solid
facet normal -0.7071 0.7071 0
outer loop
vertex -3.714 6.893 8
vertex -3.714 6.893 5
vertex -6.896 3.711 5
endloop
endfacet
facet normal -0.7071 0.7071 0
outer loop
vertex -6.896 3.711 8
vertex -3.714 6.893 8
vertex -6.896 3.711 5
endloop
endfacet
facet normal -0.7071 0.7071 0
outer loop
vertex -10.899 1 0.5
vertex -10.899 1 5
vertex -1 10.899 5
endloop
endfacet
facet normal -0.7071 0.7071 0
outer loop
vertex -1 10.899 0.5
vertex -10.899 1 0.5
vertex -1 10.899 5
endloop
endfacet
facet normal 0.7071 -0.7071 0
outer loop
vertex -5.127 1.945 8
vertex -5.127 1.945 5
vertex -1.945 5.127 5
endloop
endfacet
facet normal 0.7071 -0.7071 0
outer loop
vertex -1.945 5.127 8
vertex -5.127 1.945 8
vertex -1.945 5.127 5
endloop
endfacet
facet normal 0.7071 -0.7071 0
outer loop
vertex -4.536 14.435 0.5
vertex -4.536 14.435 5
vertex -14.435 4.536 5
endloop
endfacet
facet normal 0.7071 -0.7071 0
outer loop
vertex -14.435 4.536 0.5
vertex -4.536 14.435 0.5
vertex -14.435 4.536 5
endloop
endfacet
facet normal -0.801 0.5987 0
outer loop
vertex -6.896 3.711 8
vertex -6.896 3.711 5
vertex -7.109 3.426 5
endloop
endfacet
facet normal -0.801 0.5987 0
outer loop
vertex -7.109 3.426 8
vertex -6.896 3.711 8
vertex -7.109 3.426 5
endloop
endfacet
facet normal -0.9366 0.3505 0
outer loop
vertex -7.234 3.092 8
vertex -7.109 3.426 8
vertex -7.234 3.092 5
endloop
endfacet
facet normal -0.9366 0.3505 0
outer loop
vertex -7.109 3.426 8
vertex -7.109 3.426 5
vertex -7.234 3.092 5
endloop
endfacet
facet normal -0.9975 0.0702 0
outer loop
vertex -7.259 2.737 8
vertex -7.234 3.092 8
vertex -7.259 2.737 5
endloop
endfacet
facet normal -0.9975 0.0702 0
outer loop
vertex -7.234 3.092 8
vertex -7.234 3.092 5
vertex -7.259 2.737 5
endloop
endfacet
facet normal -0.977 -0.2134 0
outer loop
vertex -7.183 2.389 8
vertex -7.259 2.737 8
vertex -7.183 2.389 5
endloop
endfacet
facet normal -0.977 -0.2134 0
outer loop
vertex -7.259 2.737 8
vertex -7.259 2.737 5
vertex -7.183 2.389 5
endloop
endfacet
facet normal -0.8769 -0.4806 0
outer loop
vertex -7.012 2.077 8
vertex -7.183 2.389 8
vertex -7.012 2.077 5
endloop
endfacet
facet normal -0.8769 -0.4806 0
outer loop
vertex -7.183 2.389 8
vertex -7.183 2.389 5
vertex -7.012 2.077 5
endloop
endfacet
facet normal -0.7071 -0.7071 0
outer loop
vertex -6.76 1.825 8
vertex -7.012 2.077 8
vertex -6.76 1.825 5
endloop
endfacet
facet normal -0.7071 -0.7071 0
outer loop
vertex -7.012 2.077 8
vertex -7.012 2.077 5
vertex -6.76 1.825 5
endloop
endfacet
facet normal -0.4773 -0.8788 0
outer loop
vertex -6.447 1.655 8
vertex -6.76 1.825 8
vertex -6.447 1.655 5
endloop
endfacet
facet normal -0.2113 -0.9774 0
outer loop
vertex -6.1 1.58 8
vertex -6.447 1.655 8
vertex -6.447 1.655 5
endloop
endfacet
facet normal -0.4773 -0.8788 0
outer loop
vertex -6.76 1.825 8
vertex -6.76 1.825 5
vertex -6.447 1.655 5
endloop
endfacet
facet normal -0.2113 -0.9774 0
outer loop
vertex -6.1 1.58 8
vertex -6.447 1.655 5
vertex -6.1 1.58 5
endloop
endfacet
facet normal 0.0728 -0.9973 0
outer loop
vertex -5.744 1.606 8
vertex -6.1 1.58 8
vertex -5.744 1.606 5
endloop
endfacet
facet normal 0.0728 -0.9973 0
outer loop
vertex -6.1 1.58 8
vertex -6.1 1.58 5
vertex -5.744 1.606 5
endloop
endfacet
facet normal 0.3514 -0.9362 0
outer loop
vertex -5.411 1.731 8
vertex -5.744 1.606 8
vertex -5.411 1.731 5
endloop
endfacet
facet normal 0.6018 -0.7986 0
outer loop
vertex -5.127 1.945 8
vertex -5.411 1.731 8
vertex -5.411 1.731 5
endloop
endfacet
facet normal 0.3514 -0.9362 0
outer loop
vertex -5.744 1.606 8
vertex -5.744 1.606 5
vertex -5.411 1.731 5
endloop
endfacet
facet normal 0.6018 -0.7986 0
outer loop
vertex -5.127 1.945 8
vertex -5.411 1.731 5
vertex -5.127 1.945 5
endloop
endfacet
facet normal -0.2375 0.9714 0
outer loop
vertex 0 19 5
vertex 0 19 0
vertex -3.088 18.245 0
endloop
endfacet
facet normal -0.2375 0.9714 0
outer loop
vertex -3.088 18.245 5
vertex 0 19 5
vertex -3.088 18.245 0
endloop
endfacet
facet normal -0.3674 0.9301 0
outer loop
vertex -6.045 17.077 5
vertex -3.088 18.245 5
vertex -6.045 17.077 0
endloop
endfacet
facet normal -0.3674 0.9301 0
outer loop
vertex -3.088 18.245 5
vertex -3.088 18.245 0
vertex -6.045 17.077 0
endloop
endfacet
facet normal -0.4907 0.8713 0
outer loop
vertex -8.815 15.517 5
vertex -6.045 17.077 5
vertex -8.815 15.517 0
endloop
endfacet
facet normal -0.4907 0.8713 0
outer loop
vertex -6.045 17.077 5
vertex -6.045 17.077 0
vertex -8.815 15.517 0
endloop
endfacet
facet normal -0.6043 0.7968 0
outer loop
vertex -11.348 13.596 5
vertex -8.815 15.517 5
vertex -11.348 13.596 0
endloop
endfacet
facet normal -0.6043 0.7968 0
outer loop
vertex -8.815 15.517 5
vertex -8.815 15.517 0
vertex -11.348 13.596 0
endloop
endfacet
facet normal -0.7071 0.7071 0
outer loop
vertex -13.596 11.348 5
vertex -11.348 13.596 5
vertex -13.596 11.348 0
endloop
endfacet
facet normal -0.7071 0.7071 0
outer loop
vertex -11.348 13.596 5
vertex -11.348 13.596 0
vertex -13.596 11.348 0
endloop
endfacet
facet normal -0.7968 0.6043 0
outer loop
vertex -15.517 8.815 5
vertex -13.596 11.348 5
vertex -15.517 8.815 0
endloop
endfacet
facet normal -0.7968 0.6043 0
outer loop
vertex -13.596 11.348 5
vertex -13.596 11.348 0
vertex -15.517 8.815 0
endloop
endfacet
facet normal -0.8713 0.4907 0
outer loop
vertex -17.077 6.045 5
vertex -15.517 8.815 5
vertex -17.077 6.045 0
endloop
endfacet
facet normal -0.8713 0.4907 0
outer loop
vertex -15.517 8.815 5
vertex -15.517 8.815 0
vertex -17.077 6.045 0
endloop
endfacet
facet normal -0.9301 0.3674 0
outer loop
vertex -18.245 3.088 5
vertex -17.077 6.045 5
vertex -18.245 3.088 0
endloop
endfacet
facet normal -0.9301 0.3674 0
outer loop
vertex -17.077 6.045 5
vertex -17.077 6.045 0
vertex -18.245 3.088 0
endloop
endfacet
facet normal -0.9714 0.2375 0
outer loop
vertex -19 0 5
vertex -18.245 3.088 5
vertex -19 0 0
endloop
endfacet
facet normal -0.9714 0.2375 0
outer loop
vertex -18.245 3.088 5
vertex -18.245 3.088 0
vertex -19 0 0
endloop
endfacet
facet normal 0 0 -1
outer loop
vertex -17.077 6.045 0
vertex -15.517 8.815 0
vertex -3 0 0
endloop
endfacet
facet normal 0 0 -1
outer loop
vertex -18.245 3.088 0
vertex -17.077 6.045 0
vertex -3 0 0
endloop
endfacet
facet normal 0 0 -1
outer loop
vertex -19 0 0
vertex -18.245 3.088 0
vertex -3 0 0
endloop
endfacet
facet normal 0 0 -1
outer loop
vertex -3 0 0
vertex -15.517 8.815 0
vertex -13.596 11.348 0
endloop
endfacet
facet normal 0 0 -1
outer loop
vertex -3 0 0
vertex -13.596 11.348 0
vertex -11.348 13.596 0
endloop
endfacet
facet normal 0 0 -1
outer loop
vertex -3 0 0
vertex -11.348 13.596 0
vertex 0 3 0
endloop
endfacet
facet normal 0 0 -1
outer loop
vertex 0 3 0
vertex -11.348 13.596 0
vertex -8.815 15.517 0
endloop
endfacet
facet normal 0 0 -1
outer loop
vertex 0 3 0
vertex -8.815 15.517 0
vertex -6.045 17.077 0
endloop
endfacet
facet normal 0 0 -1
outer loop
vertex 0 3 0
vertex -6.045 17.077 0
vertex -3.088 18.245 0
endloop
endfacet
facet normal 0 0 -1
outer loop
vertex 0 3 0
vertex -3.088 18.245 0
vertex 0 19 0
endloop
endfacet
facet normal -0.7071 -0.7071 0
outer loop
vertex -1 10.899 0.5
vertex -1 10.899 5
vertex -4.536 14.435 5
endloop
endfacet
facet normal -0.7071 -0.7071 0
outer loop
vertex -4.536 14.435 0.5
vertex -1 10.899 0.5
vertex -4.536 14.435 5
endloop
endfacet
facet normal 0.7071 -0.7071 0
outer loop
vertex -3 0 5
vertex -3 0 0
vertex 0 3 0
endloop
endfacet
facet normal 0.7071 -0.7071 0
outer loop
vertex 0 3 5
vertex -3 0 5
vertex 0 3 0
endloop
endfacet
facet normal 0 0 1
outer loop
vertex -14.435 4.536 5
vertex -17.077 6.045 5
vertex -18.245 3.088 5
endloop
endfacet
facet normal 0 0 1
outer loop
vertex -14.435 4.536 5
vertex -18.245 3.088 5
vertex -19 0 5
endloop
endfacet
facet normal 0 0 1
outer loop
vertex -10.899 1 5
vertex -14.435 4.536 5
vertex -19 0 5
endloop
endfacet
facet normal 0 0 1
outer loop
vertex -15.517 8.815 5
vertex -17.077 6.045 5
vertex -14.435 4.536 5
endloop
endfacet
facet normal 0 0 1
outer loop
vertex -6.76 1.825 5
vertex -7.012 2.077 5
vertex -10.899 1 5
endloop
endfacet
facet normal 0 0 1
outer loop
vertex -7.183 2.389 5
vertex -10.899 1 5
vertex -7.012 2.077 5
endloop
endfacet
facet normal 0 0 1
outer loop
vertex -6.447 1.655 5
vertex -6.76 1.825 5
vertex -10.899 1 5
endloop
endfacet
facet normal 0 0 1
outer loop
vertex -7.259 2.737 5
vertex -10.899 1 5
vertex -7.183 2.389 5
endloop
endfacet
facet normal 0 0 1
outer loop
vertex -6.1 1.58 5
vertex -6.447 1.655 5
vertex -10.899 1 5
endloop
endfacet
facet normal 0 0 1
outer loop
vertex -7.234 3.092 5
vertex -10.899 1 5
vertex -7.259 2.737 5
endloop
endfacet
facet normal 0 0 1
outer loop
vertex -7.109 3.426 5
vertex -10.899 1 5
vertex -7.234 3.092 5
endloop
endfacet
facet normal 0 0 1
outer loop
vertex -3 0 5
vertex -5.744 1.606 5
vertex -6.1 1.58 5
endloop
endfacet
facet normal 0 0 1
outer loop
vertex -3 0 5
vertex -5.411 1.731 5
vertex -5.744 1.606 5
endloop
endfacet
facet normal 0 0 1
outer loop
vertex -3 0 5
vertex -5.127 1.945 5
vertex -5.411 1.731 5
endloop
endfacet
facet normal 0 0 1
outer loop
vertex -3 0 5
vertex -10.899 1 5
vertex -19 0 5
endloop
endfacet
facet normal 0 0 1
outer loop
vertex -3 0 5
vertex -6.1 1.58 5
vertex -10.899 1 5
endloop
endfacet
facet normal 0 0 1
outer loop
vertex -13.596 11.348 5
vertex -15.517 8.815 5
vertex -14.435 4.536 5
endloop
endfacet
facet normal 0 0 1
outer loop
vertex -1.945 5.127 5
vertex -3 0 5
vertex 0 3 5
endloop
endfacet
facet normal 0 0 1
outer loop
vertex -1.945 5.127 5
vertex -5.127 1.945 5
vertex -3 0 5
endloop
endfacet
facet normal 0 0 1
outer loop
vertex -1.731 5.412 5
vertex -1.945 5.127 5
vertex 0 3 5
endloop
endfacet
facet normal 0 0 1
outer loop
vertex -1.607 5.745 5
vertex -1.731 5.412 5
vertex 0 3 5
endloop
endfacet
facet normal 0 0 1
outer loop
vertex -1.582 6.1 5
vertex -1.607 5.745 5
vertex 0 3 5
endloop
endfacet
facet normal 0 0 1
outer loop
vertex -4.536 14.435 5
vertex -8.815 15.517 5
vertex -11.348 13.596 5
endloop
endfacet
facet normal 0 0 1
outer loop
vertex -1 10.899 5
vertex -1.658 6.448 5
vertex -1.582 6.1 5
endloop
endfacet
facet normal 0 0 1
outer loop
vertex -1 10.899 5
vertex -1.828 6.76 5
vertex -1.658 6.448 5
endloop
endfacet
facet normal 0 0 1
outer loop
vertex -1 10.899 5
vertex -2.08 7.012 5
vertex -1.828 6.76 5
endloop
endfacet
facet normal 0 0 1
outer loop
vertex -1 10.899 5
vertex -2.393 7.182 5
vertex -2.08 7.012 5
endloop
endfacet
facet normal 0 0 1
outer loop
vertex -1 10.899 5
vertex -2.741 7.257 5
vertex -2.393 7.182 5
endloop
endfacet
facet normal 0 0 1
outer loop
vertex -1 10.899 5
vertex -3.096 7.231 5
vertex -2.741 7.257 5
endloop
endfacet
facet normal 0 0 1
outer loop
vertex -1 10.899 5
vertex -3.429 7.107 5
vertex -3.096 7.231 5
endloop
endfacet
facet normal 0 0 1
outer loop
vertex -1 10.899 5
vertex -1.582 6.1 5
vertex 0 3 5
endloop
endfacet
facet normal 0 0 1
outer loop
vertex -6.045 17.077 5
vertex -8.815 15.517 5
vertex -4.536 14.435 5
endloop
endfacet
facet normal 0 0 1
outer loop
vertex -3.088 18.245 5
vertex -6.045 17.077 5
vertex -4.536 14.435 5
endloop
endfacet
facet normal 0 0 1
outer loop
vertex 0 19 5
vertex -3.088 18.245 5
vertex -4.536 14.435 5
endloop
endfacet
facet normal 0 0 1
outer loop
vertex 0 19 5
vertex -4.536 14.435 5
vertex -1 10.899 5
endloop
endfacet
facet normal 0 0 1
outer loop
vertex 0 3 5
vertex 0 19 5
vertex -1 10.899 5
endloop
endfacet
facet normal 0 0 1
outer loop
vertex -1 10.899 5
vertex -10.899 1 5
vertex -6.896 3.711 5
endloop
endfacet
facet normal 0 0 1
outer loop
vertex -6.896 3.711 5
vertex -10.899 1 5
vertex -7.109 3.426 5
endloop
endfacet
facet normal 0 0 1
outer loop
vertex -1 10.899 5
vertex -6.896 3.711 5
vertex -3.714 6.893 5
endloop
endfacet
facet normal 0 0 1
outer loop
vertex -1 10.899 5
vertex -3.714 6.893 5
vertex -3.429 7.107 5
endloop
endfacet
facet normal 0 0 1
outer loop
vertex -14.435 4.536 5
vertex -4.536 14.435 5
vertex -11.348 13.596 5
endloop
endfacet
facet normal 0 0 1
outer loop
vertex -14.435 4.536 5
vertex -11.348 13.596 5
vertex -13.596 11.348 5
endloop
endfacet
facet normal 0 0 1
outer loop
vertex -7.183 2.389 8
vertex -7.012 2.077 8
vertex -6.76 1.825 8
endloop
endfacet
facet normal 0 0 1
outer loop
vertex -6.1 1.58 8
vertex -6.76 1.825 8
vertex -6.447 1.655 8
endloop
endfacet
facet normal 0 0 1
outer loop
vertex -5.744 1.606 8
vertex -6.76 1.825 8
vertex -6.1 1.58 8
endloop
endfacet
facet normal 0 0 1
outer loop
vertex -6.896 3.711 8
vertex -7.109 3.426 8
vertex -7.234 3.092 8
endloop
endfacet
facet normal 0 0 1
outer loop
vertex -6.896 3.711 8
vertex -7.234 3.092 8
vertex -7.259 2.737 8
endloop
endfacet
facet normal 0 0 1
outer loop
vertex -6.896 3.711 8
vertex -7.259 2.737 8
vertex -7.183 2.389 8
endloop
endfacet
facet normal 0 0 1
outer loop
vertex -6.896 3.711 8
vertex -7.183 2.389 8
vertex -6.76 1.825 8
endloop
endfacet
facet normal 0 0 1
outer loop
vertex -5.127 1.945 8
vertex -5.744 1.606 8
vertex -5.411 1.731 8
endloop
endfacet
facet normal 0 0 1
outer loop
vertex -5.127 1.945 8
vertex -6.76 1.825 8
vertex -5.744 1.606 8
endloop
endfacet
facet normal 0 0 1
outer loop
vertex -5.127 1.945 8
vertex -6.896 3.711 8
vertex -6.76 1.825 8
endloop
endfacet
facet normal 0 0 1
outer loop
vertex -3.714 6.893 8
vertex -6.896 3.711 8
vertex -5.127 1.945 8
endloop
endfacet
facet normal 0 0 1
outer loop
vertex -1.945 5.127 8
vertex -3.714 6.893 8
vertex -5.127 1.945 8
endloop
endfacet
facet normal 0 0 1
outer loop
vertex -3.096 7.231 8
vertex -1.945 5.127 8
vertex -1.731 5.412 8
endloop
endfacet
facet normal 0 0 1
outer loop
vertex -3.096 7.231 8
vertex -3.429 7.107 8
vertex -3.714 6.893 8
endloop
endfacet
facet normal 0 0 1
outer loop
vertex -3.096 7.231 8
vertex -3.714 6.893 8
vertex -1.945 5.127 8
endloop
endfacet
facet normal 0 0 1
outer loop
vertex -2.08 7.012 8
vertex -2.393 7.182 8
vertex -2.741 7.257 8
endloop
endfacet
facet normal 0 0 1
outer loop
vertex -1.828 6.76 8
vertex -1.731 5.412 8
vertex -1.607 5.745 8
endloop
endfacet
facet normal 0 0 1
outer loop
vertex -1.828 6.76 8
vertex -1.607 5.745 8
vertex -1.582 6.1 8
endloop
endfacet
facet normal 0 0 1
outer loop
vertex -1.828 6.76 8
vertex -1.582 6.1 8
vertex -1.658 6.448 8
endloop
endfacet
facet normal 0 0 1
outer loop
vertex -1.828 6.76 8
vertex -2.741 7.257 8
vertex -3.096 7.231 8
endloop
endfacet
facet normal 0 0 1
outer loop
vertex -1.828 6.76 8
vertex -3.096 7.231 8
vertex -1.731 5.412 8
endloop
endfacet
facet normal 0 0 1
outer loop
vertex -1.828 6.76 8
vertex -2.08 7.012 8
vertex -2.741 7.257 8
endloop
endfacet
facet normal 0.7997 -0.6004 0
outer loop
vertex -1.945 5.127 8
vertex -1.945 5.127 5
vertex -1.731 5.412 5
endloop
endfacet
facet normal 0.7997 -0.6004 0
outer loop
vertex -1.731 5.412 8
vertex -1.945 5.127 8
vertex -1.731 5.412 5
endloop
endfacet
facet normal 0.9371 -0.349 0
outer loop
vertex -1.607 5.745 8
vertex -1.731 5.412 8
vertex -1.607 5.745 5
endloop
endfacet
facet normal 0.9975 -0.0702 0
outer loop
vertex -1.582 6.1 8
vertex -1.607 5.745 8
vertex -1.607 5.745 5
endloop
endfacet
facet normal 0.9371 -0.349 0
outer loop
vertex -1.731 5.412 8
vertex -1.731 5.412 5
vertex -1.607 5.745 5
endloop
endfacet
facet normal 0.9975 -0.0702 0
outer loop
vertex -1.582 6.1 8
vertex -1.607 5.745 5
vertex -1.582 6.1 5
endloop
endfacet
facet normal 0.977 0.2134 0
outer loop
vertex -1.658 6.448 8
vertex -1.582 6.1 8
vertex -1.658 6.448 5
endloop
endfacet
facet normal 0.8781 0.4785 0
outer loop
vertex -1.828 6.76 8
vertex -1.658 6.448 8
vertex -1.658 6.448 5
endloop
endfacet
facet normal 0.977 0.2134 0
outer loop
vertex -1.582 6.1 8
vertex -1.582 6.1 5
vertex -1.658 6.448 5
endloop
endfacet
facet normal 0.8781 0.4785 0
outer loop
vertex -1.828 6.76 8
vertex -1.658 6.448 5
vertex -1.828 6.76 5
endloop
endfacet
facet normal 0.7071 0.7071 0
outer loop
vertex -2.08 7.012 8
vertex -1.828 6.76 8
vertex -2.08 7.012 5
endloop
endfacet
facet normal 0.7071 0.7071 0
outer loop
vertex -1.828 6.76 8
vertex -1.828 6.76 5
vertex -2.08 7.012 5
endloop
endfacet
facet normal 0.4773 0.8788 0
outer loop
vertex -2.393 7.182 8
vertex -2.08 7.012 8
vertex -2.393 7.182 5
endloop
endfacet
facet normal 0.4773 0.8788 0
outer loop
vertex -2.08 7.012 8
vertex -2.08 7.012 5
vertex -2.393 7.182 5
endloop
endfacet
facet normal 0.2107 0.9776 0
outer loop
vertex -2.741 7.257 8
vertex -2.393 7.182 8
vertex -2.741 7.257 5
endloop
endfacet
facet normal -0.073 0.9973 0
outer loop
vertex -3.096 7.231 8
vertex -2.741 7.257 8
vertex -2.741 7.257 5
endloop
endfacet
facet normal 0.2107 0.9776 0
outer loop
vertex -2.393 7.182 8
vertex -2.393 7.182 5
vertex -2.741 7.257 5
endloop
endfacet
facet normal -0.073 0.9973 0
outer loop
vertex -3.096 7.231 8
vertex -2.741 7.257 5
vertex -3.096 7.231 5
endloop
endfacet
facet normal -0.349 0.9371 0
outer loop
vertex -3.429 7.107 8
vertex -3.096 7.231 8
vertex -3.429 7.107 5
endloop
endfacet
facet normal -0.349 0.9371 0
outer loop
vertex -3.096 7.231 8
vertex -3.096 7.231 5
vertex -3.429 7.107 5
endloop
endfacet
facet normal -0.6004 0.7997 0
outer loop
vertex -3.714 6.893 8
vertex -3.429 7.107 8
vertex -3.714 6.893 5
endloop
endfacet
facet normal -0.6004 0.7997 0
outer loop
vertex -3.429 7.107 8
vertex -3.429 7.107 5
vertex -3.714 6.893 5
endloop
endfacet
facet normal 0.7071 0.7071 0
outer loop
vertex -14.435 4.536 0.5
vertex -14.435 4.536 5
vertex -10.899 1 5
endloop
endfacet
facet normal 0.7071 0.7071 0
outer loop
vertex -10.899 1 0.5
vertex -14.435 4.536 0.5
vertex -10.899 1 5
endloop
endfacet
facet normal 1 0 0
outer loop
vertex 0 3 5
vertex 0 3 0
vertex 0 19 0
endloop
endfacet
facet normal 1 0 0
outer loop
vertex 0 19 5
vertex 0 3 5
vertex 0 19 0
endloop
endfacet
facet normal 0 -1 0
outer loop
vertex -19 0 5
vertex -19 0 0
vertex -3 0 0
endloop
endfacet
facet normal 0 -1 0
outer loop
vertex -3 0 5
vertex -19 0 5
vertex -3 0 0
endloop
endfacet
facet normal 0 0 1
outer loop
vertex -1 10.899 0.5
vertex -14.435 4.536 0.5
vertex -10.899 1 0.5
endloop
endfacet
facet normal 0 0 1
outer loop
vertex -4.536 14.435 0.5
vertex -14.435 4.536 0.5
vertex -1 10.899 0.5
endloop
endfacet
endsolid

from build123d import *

# Parameters (mm, degrees)
F1_DEPTH = 5
F3_DEPTH = 4.5
F5_DEPTH = 3


with BuildPart() as f1:
    # F0 (on Top) → F1 (new body)
    with BuildSketch(Plane.XY):
        with BuildLine():
            Line((-3, 0), (0, 3))
            Line((0, 3), (0, 19))
            ThreePointArc((0, 19), (-12.510187, 12.510187), (-19, 0))
            Line((-19, 0), (-3, 0))
        make_face()
    extrude(amount=F1_DEPTH)

    # F2 (on face) → F3 (cut)
    with BuildSketch(Plane.XY.offset(5)):
        Polygon((-10.899495, 1), (-1, 10.899495), (-4.535534, 14.435029), (-14.435029, 4.535534), align=None)
    extrude(amount=-F3_DEPTH, mode=Mode.SUBTRACT)

    # F4 (on face) → F5 (join)
    with BuildSketch(Plane.XY.offset(5)):
        with BuildLine():
            Line((-3.713925, 6.892677), (-6.895905, 3.710697))
            ThreePointArc((-6.895905, 3.710697), (-6.895098, 1.942122), (-5.126524, 1.944544))
            Line((-5.126524, 1.944544), (-1.944544, 5.126524))
            ThreePointArc((-1.944544, 5.126524), (-1.945351, 6.895099), (-3.713925, 6.892677))
        make_face()
    extrude(amount=F5_DEPTH)


solid = f1.part
